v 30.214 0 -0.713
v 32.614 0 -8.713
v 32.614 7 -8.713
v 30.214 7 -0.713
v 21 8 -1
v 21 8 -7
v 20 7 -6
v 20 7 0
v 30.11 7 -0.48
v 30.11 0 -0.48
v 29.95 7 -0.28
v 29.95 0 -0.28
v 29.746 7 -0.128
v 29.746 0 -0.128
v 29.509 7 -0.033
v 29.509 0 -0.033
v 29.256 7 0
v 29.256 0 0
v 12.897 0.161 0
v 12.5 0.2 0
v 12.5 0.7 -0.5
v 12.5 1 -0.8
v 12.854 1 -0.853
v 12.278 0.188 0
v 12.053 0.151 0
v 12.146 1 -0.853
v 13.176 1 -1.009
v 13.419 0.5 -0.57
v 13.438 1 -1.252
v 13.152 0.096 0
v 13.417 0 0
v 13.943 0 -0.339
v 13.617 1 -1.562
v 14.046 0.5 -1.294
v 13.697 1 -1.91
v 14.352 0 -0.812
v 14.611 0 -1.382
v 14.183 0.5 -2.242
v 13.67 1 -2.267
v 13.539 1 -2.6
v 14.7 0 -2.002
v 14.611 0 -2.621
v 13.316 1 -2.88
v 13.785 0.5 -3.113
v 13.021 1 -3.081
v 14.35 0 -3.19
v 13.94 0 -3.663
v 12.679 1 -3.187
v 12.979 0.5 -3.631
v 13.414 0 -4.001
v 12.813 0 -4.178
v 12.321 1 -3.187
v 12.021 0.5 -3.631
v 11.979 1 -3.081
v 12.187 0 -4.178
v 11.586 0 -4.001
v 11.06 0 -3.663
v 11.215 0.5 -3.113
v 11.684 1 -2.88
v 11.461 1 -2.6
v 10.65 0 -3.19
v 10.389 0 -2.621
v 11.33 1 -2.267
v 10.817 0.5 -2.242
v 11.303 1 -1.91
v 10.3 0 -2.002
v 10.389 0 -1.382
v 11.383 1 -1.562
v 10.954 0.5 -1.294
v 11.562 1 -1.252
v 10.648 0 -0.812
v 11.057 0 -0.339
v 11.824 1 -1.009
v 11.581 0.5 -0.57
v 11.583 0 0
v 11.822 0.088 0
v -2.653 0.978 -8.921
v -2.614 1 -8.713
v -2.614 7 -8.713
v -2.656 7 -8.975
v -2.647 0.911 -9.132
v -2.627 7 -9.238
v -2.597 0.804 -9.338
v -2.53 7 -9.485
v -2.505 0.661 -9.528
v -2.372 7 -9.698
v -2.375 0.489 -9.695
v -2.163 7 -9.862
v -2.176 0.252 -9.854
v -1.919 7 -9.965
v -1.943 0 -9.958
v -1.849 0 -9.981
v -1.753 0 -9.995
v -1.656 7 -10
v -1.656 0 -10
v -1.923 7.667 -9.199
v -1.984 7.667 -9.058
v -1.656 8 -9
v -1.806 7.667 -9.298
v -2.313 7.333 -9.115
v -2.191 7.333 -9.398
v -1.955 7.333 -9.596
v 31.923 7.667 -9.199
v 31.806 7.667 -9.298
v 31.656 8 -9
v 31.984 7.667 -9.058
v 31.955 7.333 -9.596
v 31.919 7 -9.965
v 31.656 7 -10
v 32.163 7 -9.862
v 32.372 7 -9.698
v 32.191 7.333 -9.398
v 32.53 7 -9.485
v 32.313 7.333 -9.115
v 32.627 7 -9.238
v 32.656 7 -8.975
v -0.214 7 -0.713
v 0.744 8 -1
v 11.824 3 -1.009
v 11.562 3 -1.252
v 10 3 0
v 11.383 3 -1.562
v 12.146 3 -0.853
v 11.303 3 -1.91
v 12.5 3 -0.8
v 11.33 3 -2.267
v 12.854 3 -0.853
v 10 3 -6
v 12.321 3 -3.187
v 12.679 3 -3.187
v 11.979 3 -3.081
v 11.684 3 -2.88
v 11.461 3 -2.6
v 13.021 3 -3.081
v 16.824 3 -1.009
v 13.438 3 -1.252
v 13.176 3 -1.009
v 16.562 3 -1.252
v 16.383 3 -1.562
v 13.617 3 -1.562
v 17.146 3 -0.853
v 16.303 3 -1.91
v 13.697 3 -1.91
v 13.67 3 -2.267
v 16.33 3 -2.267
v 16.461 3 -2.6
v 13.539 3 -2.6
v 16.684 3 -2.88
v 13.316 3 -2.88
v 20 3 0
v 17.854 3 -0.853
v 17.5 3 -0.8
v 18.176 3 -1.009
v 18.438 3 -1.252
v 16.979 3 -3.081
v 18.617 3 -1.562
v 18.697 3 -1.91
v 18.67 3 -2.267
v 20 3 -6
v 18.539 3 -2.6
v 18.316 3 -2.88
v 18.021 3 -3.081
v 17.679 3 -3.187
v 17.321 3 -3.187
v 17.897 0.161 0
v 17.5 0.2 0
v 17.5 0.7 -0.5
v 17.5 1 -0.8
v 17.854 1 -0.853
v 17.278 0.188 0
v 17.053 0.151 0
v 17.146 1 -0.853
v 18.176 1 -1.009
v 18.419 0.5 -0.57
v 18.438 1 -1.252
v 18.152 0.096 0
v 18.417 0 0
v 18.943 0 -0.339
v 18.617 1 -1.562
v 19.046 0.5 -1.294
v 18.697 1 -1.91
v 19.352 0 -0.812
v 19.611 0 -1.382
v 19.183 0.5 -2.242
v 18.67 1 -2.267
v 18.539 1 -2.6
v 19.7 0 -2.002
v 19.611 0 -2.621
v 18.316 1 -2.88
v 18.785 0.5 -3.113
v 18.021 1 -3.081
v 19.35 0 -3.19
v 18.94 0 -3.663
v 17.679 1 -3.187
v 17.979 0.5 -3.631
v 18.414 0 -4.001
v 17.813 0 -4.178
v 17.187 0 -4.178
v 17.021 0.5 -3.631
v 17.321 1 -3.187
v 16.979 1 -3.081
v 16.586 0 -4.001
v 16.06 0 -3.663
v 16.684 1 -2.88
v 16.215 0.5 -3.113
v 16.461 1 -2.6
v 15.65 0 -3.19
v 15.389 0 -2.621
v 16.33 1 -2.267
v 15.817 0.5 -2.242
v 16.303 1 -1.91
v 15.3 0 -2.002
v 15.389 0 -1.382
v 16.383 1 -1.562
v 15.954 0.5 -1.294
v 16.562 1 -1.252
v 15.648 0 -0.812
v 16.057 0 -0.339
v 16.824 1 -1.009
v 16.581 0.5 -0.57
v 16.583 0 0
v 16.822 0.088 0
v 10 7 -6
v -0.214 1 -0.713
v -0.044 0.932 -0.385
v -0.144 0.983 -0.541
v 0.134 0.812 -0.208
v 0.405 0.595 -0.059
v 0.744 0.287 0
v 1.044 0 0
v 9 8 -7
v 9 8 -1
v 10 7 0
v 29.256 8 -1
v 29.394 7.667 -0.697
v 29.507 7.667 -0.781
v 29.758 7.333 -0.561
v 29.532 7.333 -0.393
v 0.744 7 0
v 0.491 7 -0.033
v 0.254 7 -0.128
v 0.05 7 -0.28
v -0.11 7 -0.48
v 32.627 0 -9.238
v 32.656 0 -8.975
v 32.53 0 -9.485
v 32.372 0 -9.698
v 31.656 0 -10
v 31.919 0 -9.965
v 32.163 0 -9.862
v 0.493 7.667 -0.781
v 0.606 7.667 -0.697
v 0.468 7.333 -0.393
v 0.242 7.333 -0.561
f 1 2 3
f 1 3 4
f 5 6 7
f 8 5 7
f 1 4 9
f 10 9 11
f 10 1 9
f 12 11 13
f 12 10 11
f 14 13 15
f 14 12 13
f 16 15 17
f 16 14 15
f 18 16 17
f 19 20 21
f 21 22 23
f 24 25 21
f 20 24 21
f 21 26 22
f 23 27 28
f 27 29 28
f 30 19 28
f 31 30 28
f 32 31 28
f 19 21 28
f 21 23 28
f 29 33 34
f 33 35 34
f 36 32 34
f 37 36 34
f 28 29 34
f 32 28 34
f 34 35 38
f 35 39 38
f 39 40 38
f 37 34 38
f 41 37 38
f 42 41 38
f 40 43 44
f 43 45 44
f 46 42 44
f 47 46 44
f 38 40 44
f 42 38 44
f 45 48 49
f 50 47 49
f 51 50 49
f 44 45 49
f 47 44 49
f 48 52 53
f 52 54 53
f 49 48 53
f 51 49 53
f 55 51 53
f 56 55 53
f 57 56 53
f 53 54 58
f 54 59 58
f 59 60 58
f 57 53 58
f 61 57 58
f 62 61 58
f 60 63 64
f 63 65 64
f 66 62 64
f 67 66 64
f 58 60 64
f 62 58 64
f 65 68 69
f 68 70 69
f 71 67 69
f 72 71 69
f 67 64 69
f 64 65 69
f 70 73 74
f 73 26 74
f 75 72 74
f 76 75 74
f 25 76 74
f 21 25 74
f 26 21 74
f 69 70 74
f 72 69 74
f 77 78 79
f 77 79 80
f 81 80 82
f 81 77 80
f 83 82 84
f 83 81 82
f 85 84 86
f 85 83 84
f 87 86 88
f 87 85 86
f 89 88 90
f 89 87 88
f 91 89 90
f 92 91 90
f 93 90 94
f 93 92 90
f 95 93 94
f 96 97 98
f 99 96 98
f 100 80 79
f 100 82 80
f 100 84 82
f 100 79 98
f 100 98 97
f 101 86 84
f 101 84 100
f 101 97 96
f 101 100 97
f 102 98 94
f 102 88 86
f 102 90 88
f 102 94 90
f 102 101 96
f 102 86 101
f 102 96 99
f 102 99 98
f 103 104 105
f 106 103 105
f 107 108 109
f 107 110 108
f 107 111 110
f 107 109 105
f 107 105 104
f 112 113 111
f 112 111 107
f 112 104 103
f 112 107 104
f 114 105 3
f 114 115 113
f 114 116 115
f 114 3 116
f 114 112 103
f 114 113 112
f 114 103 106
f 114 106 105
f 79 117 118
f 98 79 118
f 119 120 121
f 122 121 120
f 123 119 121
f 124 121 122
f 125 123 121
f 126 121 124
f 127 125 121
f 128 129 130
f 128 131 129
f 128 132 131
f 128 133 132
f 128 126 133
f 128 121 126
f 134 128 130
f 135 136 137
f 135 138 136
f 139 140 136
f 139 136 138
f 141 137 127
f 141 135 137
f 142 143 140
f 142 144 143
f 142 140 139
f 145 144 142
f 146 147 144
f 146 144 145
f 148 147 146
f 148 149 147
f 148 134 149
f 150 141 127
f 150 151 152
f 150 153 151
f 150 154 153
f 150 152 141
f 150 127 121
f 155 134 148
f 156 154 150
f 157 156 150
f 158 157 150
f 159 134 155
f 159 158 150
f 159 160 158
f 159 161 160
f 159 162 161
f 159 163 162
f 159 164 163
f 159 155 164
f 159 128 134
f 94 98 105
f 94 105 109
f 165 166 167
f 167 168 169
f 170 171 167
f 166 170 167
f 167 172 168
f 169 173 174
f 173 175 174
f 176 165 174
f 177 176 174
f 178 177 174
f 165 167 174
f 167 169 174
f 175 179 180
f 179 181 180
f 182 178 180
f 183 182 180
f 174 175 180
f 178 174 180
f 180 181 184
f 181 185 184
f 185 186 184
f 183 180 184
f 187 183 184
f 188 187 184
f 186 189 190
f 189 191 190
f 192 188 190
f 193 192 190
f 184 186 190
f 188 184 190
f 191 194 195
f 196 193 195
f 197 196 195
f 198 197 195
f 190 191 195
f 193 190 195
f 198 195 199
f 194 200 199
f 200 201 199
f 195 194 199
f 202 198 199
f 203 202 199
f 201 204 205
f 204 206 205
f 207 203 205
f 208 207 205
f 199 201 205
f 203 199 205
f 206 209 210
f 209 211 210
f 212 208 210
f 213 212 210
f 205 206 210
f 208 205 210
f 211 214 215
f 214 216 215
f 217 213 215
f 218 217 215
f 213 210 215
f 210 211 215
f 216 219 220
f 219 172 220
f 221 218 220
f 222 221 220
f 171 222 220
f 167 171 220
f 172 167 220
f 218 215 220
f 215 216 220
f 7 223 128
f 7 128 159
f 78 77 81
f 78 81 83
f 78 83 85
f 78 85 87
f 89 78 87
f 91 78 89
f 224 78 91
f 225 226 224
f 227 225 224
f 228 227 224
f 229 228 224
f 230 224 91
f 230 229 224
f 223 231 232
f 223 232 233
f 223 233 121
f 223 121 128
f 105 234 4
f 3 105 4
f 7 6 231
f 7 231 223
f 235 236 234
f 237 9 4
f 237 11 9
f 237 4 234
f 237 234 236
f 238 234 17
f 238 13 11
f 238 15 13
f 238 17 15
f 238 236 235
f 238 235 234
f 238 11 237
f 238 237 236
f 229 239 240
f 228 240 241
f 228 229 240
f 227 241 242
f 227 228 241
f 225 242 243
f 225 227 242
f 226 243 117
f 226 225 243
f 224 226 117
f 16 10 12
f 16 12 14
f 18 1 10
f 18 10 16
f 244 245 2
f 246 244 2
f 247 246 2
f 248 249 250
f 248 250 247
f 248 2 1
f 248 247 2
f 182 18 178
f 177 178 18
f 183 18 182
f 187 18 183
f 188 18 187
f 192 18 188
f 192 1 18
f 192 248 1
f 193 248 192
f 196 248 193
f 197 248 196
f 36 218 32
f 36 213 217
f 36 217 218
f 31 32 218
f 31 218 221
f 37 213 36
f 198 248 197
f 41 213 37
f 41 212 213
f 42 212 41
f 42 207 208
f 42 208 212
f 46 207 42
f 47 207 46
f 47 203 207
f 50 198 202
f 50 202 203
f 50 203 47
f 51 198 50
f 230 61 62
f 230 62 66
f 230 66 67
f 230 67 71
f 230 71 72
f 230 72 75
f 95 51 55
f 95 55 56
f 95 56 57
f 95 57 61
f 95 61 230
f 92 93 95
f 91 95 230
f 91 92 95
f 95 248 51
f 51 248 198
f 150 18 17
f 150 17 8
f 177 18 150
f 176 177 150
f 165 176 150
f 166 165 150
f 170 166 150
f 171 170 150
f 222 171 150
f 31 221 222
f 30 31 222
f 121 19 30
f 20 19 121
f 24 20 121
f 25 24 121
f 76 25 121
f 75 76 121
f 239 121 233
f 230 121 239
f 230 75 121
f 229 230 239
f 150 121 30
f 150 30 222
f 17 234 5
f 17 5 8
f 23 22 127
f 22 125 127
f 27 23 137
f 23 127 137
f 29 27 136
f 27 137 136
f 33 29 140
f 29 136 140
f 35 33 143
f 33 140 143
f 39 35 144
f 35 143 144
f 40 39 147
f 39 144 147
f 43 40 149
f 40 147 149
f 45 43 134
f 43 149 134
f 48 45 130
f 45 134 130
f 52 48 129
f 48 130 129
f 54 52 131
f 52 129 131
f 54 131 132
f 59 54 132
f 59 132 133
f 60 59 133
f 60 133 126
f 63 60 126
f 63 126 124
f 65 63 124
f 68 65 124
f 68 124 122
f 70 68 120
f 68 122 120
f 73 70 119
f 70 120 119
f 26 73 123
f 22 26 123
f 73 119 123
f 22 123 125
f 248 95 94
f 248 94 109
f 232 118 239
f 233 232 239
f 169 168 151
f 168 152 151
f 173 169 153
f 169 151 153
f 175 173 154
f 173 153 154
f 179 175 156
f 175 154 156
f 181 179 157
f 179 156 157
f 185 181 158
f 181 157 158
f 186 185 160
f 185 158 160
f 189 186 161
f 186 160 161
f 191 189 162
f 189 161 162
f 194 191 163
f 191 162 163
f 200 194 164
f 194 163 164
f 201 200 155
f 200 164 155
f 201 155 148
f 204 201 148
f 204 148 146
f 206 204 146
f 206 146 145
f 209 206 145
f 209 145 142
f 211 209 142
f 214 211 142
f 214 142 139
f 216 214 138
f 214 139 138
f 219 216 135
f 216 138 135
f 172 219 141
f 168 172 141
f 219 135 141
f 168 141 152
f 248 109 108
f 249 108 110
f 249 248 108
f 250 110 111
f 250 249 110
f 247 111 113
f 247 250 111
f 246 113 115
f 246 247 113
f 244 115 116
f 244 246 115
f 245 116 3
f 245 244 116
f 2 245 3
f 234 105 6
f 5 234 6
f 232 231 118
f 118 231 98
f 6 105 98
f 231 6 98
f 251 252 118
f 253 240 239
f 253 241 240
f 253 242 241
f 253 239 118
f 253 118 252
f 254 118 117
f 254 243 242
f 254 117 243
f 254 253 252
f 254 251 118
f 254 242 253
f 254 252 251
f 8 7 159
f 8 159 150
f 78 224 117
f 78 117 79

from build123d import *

# Parameters (mm, degrees)
RESSALTO_EXTRUS_O2_DEPTH                             = 8
ESBO_O5_W                                            = 10
ESBO_O5_H                                            = 6
CORTE_EXTRUS_O1_DEPTH                                = 5
ESCAREADO_PARA_PARAFUSO_COM_CABE_A_ESCAR_D           = 2.4
ESCAREADO_PARA_PARAFUSO_COM_CABE_A_ESCAR_CSINK_D     = 4.4
ESCAREADO_PARA_PARAFUSO_COM_CABE_A_ESCAR_CSINK_ANGLE = 90
CHANFRO1_SIZE                                        = 1


with BuildPart() as part:
    # Esboço2 → Ressalto-extrusão2 (new body)
    with BuildSketch(Plane(origin=(0, 0, 0), x_dir=(1, 0, 0), z_dir=(0, 1, 0))):
        with BuildLine():
            Line((-0.213795634, 0.712652114), (-2.613795634, 8.712652114))
            ThreePointArc((-2.613795634, 8.712652114), (-2.458262277, 9.59693053), (-1.655969349, 10))
            Line((-1.655969349, 10), (31.655969349, 10))
            ThreePointArc((31.655969349, 10), (32.458262277, 9.59693053), (32.613795634, 8.712652114))
            Line((32.613795634, 8.712652114), (30.213795634, 0.712652114))
            ThreePointArc((30.213795634, 0.712652114), (29.852899879, 0.197707072), (29.255969349, 0))
            Line((29.255969349, 0), (0.744030651, 0))
            ThreePointArc((0.744030651, 0), (0.147100121, 0.197707072), (-0.213795634, 0.712652114))
        make_face()
    extrude(amount=RESSALTO_EXTRUS_O2_DEPTH)

    # Esboço5 → Corte-extrusão1 (cut)
    with BuildSketch(Plane(origin=(0, 8, 0), x_dir=(1, 0, 0), z_dir=(0, 1, 0))):
        with Locations((15, 3)):
            Rectangle(ESBO_O5_W, ESBO_O5_H)
    extrude(amount=-CORTE_EXTRUS_O1_DEPTH, mode=Mode.SUBTRACT)

    # Escareado para parafuso com cabeça escareada chata de M21 (through all)
    with Locations(Plane(origin=(17.5, 0, -2), x_dir=(0, 0, -1), z_dir=(0, -1, 0))):
        with Locations((0, 0), (0, -5)):
            CounterSinkHole(ESCAREADO_PARA_PARAFUSO_COM_CABE_A_ESCAR_D / 2, ESCAREADO_PARA_PARAFUSO_COM_CABE_A_ESCAR_CSINK_D / 2, counter_sink_angle=ESCAREADO_PARA_PARAFUSO_COM_CABE_A_ESCAR_CSINK_ANGLE)

    # Chanfro1
    # the kernel refuses this chamfer: 1 mm, written as the material it takes off along each edge
    with BuildSketch(Plane(origin=(10, 8, -6), x_dir=(0, 0, -1), z_dir=(1, 0, 0))) as chanfro1_piece_1:
        Polygon((CHANFRO1_SIZE, 0), (0, -CHANFRO1_SIZE), (0, 0), align=None)
    extrude(amount=10, mode=Mode.SUBTRACT)
    with BuildSketch(Plane(origin=(10, 8, 2.571682988), x_dir=(-1, 0, 0), z_dir=(0, 0, -1)), Plane(origin=(20, 8, -6), x_dir=(1, 0, 0), z_dir=(0, 0, 1))) as chanfro1_piece_2:
        Polygon((CHANFRO1_SIZE, 0), (0, -CHANFRO1_SIZE), (0, 0), align=None)
    extrude(amount=8.571682988, mode=Mode.SUBTRACT)
    with BuildSketch(Plane(origin=(12.571682988, 8, 0), x_dir=(0, 0, -1), z_dir=(-1, 0, 0)), Plane(origin=(29.255969349, 8, 0), x_dir=(0, 0, -1), z_dir=(-1, 0, 0))) as chanfro1_piece_3:
        Polygon((CHANFRO1_SIZE, 0), (0, CHANFRO1_SIZE), (0, 0), align=None)
    extrude(amount=11.827652337, mode=Mode.SUBTRACT)
    with BuildSketch(Plane(origin=(0.744030651, 8, -1), x_dir=(0, 0, 1), z_dir=(1, 0, 0))) as chanfro1_piece_4:
        Polygon((1 - CHANFRO1_SIZE, 0), (1, CHANFRO1_SIZE), (1, 0), align=None)
    revolve(axis=Axis((0.744030651, 8, -1), (0, -1, 0)), revolution_arc=73.300755766, mode=Mode.SUBTRACT)
    with BuildSketch(Plane(origin=(-0.213795634, 8, -0.712652114), x_dir=(0, -1, 0), z_dir=(-0.28734788556634544, 0, -0.9578262852211514))) as chanfro1_piece_5:
        Polygon((CHANFRO1_SIZE, 0), (0, -CHANFRO1_SIZE), (0, 0), align=None)
    extrude(amount=8.352245207, mode=Mode.SUBTRACT)
    with BuildSketch(Plane(origin=(-1.655969349, 8, -9), x_dir=(-0.957826285221151, 0, 0.2873478855663471), z_dir=(0.2873478855663471, 0, 0.957826285221151))) as chanfro1_piece_6:
        Polygon((1 - CHANFRO1_SIZE, 0), (1, CHANFRO1_SIZE), (1, 0), align=None)
    revolve(axis=Axis((-1.655969349, 8, -9), (0, -1, 0)), revolution_arc=106.699244234, mode=Mode.SUBTRACT)
    with BuildSketch(Plane(origin=(-1.655969349, 8, -10), x_dir=(0, 0, 1), z_dir=(1, 0, 0))) as chanfro1_piece_7:
        Polygon((CHANFRO1_SIZE, 0), (0, CHANFRO1_SIZE), (0, 0), align=None)
    extrude(amount=33.311938698, mode=Mode.SUBTRACT)
    with BuildSketch(Plane(origin=(31.655969349, 8, -9), x_dir=(0, 0, -1), z_dir=(-1, 0, 0))) as chanfro1_piece_8:
        Polygon((1 - CHANFRO1_SIZE, 0), (1, CHANFRO1_SIZE), (1, 0), align=None)
    revolve(axis=Axis((31.655969349, 8, -9), (0, -1, 0)), revolution_arc=106.699244234, mode=Mode.SUBTRACT)
    with BuildSketch(Plane(origin=(32.613795634, 8, -8.712652114), x_dir=(-0.9578262852211513, 0, -0.2873478855663455), z_dir=(-0.28734788556634555, 0, 0.9578262852211514))) as chanfro1_piece_9:
        Polygon((CHANFRO1_SIZE, 0), (0, CHANFRO1_SIZE), (0, 0), align=None)
    extrude(amount=8.352245207, mode=Mode.SUBTRACT)
    with BuildSketch(Plane(origin=(29.255969349, 8, -1), x_dir=(0.9578262852211534, 0, 0.2873478855663385), z_dir=(0.2873478855663385, 0, -0.9578262852211534))) as chanfro1_piece_10:
        Polygon((1 - CHANFRO1_SIZE, 0), (1, CHANFRO1_SIZE), (1, 0), align=None)
    revolve(axis=Axis((29.255969349, 8, -1), (0, -1, 0)), revolution_arc=73.300755766, mode=Mode.SUBTRACT)
    with BuildSketch(Plane(origin=(0.525172035, 0, 1.750573449), x_dir=(0, 1, 0), z_dir=(-0.28734788556634544, 0, -0.9578262852211514))) as chanfro1_piece_11:
        Polygon((CHANFRO1_SIZE, 0), (0, CHANFRO1_SIZE), (0, 0), align=None)
    extrude(amount=13.495611183, mode=Mode.SUBTRACT)
    with BuildSketch(Plane(origin=(10, 8, 0), x_dir=(-1, 0, 0), z_dir=(0, 0, -1))) as chanfro1_piece_12a_section:
        Polygon((CHANFRO1_SIZE, 0), (0, -CHANFRO1_SIZE), (0, 0), align=None)
    chanfro1_piece_12a = extrude(amount=8.571682988, mode=Mode.PRIVATE)
    chanfro1_piece_12a = split(chanfro1_piece_12a, bisect_by=Plane(origin=(10, 8, -6), z_dir=(0, 0, -1)), keep=Keep.TOP, mode=Mode.PRIVATE)
    with BuildSketch(Plane(origin=(7.428317012, 8, -6), x_dir=(0, 0, -1), z_dir=(1, 0, 0))) as chanfro1_piece_12b_section:
        Polygon((CHANFRO1_SIZE, 0), (0, -CHANFRO1_SIZE), (0, 0), align=None)
    chanfro1_piece_12b = extrude(amount=12.571682988, mode=Mode.PRIVATE)
    chanfro1_piece_12b = split(chanfro1_piece_12b, bisect_by=Plane(origin=(10, 8, -6), z_dir=(-1, 0, 0)), keep=Keep.TOP, mode=Mode.PRIVATE)
    chanfro1_piece_12 = chanfro1_piece_12a & chanfro1_piece_12b
    add(chanfro1_piece_12, mode=Mode.SUBTRACT)
    with BuildSketch(Plane(origin=(10, 8, -6), x_dir=(0, 0, -1), z_dir=(1, 0, 0))) as chanfro1_piece_13a_section:
        Polygon((CHANFRO1_SIZE, 0), (0, -CHANFRO1_SIZE), (0, 0), align=None)
    chanfro1_piece_13a = extrude(amount=12.571682988, mode=Mode.PRIVATE)
    chanfro1_piece_13a = split(chanfro1_piece_13a, bisect_by=Plane(origin=(20, 8, -6), z_dir=(1, 0, 0)), keep=Keep.TOP, mode=Mode.PRIVATE)
    with BuildSketch(Plane(origin=(20, 8, -8.571682988), x_dir=(1, 0, 0), z_dir=(0, 0, 1))) as chanfro1_piece_13b_section:
        Polygon((CHANFRO1_SIZE, 0), (0, -CHANFRO1_SIZE), (0, 0), align=None)
    chanfro1_piece_13b = extrude(amount=8.571682988, mode=Mode.PRIVATE)
    chanfro1_piece_13b = split(chanfro1_piece_13b, bisect_by=Plane(origin=(20, 8, -6), z_dir=(0, 0, -1)), keep=Keep.TOP, mode=Mode.PRIVATE)
    chanfro1_piece_13 = chanfro1_piece_13a & chanfro1_piece_13b
    add(chanfro1_piece_13, mode=Mode.SUBTRACT)


solid = part.part
